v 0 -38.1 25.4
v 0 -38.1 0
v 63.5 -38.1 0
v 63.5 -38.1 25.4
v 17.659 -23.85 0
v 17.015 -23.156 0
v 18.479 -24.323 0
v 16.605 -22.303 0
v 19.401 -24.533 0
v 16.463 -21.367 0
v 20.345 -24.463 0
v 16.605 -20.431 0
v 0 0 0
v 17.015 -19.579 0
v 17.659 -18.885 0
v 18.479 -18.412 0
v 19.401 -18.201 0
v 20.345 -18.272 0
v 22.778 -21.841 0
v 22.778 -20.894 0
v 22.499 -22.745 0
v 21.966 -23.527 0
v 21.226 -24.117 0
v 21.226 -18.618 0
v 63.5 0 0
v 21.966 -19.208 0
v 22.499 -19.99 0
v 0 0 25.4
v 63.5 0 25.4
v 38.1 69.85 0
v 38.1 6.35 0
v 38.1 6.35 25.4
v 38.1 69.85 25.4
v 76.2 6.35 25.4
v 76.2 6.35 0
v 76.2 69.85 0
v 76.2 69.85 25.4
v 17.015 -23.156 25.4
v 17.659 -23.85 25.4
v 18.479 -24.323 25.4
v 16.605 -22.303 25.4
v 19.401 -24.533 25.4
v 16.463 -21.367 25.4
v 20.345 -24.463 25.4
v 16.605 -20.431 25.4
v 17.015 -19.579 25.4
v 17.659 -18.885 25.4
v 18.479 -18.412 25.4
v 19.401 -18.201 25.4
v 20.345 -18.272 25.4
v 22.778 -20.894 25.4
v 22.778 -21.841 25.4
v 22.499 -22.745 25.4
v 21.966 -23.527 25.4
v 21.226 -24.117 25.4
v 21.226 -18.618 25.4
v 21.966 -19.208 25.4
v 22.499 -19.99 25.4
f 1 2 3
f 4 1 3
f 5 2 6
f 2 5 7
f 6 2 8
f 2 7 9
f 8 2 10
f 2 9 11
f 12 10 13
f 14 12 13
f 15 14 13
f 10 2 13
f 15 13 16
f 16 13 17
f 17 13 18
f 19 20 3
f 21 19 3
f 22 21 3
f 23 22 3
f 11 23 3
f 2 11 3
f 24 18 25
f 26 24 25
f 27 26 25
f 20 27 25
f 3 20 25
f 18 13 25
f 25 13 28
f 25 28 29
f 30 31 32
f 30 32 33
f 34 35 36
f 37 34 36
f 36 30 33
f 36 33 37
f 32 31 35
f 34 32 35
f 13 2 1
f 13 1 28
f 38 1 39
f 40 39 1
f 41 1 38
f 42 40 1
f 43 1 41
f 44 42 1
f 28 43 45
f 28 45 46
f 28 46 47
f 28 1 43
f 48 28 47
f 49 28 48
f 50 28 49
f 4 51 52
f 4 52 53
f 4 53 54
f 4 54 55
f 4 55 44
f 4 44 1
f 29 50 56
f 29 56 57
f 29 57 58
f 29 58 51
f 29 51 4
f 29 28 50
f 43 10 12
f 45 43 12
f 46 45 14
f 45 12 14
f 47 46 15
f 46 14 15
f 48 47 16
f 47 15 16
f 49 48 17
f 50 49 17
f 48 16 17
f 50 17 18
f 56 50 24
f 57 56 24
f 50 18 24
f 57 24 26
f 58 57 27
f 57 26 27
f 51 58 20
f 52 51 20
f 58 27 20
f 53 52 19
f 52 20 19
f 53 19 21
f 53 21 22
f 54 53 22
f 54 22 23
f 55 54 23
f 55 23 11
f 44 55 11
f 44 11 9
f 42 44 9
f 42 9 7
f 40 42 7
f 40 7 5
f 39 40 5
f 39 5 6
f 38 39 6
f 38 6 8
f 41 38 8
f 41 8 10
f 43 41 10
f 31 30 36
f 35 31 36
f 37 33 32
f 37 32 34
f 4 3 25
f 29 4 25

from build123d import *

# Parameters (mm, degrees)
F0_W     = 63.5
F0_H     = 38.1
F0_W_2   = 38.1
F0_H_2   = 63.5
F1_DEPTH = 25.4
F3_D     = 6.35


with BuildPart() as f1:
    # F0 (on Top) → F1 (new body)
    with BuildSketch(Plane.XY):
        with Locations((31.75, -19.05)):
            Rectangle(F0_W, F0_H)
        with Locations((57.15, 38.1)):
            Rectangle(F0_W_2, F0_H_2)
    extrude(amount=F1_DEPTH)

    # F3 (through all)
    with Locations(Plane.XY.offset(25.4)):
        with Locations((19.638494, -21.367334)):
            Hole(F3_D / 2)


solid = f1.part
